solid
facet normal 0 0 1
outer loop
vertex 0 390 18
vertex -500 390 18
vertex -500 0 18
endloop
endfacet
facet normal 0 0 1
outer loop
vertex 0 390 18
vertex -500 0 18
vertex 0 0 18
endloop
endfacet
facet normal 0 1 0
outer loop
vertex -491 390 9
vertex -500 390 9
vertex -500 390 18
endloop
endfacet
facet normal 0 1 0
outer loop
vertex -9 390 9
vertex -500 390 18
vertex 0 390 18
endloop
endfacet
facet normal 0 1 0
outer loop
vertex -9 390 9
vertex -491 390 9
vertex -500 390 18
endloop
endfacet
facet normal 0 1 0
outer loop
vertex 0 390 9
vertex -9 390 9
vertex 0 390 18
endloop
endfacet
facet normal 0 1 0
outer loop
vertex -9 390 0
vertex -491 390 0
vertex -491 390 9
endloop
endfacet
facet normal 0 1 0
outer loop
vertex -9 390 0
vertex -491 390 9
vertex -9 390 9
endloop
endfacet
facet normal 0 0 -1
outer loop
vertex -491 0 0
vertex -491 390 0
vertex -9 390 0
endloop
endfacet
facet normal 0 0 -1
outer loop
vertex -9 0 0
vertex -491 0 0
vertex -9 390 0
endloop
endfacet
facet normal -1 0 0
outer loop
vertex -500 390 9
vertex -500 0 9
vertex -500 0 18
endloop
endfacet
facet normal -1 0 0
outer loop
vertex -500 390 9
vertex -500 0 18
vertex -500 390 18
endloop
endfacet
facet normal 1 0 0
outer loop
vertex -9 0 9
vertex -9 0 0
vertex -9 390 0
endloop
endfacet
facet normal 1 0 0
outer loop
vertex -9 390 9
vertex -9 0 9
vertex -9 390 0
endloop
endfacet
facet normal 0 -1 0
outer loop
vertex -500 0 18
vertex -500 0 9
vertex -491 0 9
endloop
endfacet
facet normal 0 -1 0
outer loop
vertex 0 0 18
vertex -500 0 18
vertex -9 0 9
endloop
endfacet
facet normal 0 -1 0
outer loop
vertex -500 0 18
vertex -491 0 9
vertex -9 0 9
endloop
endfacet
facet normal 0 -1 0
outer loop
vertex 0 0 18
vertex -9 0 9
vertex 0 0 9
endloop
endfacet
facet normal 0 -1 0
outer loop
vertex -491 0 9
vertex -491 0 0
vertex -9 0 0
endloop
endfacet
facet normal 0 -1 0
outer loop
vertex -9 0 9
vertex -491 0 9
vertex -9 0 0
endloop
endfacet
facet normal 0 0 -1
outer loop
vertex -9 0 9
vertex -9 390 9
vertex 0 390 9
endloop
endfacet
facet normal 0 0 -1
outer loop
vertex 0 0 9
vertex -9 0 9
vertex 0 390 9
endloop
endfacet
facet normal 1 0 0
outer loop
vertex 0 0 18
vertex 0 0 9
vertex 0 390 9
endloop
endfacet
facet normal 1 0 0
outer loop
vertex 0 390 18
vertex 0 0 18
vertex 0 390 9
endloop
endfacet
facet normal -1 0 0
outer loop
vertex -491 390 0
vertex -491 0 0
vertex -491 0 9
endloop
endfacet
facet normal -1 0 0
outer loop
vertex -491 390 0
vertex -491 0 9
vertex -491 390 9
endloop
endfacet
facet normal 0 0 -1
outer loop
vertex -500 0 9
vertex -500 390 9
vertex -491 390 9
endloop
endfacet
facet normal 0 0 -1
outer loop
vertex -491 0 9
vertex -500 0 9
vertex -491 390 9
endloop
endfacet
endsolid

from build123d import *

# Parameters (mm, degrees)
SKETCH_W     = 500
SKETCH_H     = 390
PAD_DEPTH    = 18
SKETCH001_W  = 9
SKETCH001_H  = 390
POCKET_DEPTH = 9


with BuildPart() as part:
    # Sketch → Pad (new body)
    with BuildSketch(Plane.XY):
        with Locations((-250, 195)):
            Rectangle(SKETCH_W, SKETCH_H)
    extrude(amount=PAD_DEPTH)

    # Sketch001 → Pocket (cut)
    with BuildSketch(Plane.XY):
        with Locations((-4.5, 195)):
            Rectangle(SKETCH001_W, SKETCH001_H)
        with Locations((-495.5, 195)):
            Rectangle(SKETCH001_W, SKETCH001_H)
    extrude(amount=POCKET_DEPTH, mode=Mode.SUBTRACT)


solid = part.part
